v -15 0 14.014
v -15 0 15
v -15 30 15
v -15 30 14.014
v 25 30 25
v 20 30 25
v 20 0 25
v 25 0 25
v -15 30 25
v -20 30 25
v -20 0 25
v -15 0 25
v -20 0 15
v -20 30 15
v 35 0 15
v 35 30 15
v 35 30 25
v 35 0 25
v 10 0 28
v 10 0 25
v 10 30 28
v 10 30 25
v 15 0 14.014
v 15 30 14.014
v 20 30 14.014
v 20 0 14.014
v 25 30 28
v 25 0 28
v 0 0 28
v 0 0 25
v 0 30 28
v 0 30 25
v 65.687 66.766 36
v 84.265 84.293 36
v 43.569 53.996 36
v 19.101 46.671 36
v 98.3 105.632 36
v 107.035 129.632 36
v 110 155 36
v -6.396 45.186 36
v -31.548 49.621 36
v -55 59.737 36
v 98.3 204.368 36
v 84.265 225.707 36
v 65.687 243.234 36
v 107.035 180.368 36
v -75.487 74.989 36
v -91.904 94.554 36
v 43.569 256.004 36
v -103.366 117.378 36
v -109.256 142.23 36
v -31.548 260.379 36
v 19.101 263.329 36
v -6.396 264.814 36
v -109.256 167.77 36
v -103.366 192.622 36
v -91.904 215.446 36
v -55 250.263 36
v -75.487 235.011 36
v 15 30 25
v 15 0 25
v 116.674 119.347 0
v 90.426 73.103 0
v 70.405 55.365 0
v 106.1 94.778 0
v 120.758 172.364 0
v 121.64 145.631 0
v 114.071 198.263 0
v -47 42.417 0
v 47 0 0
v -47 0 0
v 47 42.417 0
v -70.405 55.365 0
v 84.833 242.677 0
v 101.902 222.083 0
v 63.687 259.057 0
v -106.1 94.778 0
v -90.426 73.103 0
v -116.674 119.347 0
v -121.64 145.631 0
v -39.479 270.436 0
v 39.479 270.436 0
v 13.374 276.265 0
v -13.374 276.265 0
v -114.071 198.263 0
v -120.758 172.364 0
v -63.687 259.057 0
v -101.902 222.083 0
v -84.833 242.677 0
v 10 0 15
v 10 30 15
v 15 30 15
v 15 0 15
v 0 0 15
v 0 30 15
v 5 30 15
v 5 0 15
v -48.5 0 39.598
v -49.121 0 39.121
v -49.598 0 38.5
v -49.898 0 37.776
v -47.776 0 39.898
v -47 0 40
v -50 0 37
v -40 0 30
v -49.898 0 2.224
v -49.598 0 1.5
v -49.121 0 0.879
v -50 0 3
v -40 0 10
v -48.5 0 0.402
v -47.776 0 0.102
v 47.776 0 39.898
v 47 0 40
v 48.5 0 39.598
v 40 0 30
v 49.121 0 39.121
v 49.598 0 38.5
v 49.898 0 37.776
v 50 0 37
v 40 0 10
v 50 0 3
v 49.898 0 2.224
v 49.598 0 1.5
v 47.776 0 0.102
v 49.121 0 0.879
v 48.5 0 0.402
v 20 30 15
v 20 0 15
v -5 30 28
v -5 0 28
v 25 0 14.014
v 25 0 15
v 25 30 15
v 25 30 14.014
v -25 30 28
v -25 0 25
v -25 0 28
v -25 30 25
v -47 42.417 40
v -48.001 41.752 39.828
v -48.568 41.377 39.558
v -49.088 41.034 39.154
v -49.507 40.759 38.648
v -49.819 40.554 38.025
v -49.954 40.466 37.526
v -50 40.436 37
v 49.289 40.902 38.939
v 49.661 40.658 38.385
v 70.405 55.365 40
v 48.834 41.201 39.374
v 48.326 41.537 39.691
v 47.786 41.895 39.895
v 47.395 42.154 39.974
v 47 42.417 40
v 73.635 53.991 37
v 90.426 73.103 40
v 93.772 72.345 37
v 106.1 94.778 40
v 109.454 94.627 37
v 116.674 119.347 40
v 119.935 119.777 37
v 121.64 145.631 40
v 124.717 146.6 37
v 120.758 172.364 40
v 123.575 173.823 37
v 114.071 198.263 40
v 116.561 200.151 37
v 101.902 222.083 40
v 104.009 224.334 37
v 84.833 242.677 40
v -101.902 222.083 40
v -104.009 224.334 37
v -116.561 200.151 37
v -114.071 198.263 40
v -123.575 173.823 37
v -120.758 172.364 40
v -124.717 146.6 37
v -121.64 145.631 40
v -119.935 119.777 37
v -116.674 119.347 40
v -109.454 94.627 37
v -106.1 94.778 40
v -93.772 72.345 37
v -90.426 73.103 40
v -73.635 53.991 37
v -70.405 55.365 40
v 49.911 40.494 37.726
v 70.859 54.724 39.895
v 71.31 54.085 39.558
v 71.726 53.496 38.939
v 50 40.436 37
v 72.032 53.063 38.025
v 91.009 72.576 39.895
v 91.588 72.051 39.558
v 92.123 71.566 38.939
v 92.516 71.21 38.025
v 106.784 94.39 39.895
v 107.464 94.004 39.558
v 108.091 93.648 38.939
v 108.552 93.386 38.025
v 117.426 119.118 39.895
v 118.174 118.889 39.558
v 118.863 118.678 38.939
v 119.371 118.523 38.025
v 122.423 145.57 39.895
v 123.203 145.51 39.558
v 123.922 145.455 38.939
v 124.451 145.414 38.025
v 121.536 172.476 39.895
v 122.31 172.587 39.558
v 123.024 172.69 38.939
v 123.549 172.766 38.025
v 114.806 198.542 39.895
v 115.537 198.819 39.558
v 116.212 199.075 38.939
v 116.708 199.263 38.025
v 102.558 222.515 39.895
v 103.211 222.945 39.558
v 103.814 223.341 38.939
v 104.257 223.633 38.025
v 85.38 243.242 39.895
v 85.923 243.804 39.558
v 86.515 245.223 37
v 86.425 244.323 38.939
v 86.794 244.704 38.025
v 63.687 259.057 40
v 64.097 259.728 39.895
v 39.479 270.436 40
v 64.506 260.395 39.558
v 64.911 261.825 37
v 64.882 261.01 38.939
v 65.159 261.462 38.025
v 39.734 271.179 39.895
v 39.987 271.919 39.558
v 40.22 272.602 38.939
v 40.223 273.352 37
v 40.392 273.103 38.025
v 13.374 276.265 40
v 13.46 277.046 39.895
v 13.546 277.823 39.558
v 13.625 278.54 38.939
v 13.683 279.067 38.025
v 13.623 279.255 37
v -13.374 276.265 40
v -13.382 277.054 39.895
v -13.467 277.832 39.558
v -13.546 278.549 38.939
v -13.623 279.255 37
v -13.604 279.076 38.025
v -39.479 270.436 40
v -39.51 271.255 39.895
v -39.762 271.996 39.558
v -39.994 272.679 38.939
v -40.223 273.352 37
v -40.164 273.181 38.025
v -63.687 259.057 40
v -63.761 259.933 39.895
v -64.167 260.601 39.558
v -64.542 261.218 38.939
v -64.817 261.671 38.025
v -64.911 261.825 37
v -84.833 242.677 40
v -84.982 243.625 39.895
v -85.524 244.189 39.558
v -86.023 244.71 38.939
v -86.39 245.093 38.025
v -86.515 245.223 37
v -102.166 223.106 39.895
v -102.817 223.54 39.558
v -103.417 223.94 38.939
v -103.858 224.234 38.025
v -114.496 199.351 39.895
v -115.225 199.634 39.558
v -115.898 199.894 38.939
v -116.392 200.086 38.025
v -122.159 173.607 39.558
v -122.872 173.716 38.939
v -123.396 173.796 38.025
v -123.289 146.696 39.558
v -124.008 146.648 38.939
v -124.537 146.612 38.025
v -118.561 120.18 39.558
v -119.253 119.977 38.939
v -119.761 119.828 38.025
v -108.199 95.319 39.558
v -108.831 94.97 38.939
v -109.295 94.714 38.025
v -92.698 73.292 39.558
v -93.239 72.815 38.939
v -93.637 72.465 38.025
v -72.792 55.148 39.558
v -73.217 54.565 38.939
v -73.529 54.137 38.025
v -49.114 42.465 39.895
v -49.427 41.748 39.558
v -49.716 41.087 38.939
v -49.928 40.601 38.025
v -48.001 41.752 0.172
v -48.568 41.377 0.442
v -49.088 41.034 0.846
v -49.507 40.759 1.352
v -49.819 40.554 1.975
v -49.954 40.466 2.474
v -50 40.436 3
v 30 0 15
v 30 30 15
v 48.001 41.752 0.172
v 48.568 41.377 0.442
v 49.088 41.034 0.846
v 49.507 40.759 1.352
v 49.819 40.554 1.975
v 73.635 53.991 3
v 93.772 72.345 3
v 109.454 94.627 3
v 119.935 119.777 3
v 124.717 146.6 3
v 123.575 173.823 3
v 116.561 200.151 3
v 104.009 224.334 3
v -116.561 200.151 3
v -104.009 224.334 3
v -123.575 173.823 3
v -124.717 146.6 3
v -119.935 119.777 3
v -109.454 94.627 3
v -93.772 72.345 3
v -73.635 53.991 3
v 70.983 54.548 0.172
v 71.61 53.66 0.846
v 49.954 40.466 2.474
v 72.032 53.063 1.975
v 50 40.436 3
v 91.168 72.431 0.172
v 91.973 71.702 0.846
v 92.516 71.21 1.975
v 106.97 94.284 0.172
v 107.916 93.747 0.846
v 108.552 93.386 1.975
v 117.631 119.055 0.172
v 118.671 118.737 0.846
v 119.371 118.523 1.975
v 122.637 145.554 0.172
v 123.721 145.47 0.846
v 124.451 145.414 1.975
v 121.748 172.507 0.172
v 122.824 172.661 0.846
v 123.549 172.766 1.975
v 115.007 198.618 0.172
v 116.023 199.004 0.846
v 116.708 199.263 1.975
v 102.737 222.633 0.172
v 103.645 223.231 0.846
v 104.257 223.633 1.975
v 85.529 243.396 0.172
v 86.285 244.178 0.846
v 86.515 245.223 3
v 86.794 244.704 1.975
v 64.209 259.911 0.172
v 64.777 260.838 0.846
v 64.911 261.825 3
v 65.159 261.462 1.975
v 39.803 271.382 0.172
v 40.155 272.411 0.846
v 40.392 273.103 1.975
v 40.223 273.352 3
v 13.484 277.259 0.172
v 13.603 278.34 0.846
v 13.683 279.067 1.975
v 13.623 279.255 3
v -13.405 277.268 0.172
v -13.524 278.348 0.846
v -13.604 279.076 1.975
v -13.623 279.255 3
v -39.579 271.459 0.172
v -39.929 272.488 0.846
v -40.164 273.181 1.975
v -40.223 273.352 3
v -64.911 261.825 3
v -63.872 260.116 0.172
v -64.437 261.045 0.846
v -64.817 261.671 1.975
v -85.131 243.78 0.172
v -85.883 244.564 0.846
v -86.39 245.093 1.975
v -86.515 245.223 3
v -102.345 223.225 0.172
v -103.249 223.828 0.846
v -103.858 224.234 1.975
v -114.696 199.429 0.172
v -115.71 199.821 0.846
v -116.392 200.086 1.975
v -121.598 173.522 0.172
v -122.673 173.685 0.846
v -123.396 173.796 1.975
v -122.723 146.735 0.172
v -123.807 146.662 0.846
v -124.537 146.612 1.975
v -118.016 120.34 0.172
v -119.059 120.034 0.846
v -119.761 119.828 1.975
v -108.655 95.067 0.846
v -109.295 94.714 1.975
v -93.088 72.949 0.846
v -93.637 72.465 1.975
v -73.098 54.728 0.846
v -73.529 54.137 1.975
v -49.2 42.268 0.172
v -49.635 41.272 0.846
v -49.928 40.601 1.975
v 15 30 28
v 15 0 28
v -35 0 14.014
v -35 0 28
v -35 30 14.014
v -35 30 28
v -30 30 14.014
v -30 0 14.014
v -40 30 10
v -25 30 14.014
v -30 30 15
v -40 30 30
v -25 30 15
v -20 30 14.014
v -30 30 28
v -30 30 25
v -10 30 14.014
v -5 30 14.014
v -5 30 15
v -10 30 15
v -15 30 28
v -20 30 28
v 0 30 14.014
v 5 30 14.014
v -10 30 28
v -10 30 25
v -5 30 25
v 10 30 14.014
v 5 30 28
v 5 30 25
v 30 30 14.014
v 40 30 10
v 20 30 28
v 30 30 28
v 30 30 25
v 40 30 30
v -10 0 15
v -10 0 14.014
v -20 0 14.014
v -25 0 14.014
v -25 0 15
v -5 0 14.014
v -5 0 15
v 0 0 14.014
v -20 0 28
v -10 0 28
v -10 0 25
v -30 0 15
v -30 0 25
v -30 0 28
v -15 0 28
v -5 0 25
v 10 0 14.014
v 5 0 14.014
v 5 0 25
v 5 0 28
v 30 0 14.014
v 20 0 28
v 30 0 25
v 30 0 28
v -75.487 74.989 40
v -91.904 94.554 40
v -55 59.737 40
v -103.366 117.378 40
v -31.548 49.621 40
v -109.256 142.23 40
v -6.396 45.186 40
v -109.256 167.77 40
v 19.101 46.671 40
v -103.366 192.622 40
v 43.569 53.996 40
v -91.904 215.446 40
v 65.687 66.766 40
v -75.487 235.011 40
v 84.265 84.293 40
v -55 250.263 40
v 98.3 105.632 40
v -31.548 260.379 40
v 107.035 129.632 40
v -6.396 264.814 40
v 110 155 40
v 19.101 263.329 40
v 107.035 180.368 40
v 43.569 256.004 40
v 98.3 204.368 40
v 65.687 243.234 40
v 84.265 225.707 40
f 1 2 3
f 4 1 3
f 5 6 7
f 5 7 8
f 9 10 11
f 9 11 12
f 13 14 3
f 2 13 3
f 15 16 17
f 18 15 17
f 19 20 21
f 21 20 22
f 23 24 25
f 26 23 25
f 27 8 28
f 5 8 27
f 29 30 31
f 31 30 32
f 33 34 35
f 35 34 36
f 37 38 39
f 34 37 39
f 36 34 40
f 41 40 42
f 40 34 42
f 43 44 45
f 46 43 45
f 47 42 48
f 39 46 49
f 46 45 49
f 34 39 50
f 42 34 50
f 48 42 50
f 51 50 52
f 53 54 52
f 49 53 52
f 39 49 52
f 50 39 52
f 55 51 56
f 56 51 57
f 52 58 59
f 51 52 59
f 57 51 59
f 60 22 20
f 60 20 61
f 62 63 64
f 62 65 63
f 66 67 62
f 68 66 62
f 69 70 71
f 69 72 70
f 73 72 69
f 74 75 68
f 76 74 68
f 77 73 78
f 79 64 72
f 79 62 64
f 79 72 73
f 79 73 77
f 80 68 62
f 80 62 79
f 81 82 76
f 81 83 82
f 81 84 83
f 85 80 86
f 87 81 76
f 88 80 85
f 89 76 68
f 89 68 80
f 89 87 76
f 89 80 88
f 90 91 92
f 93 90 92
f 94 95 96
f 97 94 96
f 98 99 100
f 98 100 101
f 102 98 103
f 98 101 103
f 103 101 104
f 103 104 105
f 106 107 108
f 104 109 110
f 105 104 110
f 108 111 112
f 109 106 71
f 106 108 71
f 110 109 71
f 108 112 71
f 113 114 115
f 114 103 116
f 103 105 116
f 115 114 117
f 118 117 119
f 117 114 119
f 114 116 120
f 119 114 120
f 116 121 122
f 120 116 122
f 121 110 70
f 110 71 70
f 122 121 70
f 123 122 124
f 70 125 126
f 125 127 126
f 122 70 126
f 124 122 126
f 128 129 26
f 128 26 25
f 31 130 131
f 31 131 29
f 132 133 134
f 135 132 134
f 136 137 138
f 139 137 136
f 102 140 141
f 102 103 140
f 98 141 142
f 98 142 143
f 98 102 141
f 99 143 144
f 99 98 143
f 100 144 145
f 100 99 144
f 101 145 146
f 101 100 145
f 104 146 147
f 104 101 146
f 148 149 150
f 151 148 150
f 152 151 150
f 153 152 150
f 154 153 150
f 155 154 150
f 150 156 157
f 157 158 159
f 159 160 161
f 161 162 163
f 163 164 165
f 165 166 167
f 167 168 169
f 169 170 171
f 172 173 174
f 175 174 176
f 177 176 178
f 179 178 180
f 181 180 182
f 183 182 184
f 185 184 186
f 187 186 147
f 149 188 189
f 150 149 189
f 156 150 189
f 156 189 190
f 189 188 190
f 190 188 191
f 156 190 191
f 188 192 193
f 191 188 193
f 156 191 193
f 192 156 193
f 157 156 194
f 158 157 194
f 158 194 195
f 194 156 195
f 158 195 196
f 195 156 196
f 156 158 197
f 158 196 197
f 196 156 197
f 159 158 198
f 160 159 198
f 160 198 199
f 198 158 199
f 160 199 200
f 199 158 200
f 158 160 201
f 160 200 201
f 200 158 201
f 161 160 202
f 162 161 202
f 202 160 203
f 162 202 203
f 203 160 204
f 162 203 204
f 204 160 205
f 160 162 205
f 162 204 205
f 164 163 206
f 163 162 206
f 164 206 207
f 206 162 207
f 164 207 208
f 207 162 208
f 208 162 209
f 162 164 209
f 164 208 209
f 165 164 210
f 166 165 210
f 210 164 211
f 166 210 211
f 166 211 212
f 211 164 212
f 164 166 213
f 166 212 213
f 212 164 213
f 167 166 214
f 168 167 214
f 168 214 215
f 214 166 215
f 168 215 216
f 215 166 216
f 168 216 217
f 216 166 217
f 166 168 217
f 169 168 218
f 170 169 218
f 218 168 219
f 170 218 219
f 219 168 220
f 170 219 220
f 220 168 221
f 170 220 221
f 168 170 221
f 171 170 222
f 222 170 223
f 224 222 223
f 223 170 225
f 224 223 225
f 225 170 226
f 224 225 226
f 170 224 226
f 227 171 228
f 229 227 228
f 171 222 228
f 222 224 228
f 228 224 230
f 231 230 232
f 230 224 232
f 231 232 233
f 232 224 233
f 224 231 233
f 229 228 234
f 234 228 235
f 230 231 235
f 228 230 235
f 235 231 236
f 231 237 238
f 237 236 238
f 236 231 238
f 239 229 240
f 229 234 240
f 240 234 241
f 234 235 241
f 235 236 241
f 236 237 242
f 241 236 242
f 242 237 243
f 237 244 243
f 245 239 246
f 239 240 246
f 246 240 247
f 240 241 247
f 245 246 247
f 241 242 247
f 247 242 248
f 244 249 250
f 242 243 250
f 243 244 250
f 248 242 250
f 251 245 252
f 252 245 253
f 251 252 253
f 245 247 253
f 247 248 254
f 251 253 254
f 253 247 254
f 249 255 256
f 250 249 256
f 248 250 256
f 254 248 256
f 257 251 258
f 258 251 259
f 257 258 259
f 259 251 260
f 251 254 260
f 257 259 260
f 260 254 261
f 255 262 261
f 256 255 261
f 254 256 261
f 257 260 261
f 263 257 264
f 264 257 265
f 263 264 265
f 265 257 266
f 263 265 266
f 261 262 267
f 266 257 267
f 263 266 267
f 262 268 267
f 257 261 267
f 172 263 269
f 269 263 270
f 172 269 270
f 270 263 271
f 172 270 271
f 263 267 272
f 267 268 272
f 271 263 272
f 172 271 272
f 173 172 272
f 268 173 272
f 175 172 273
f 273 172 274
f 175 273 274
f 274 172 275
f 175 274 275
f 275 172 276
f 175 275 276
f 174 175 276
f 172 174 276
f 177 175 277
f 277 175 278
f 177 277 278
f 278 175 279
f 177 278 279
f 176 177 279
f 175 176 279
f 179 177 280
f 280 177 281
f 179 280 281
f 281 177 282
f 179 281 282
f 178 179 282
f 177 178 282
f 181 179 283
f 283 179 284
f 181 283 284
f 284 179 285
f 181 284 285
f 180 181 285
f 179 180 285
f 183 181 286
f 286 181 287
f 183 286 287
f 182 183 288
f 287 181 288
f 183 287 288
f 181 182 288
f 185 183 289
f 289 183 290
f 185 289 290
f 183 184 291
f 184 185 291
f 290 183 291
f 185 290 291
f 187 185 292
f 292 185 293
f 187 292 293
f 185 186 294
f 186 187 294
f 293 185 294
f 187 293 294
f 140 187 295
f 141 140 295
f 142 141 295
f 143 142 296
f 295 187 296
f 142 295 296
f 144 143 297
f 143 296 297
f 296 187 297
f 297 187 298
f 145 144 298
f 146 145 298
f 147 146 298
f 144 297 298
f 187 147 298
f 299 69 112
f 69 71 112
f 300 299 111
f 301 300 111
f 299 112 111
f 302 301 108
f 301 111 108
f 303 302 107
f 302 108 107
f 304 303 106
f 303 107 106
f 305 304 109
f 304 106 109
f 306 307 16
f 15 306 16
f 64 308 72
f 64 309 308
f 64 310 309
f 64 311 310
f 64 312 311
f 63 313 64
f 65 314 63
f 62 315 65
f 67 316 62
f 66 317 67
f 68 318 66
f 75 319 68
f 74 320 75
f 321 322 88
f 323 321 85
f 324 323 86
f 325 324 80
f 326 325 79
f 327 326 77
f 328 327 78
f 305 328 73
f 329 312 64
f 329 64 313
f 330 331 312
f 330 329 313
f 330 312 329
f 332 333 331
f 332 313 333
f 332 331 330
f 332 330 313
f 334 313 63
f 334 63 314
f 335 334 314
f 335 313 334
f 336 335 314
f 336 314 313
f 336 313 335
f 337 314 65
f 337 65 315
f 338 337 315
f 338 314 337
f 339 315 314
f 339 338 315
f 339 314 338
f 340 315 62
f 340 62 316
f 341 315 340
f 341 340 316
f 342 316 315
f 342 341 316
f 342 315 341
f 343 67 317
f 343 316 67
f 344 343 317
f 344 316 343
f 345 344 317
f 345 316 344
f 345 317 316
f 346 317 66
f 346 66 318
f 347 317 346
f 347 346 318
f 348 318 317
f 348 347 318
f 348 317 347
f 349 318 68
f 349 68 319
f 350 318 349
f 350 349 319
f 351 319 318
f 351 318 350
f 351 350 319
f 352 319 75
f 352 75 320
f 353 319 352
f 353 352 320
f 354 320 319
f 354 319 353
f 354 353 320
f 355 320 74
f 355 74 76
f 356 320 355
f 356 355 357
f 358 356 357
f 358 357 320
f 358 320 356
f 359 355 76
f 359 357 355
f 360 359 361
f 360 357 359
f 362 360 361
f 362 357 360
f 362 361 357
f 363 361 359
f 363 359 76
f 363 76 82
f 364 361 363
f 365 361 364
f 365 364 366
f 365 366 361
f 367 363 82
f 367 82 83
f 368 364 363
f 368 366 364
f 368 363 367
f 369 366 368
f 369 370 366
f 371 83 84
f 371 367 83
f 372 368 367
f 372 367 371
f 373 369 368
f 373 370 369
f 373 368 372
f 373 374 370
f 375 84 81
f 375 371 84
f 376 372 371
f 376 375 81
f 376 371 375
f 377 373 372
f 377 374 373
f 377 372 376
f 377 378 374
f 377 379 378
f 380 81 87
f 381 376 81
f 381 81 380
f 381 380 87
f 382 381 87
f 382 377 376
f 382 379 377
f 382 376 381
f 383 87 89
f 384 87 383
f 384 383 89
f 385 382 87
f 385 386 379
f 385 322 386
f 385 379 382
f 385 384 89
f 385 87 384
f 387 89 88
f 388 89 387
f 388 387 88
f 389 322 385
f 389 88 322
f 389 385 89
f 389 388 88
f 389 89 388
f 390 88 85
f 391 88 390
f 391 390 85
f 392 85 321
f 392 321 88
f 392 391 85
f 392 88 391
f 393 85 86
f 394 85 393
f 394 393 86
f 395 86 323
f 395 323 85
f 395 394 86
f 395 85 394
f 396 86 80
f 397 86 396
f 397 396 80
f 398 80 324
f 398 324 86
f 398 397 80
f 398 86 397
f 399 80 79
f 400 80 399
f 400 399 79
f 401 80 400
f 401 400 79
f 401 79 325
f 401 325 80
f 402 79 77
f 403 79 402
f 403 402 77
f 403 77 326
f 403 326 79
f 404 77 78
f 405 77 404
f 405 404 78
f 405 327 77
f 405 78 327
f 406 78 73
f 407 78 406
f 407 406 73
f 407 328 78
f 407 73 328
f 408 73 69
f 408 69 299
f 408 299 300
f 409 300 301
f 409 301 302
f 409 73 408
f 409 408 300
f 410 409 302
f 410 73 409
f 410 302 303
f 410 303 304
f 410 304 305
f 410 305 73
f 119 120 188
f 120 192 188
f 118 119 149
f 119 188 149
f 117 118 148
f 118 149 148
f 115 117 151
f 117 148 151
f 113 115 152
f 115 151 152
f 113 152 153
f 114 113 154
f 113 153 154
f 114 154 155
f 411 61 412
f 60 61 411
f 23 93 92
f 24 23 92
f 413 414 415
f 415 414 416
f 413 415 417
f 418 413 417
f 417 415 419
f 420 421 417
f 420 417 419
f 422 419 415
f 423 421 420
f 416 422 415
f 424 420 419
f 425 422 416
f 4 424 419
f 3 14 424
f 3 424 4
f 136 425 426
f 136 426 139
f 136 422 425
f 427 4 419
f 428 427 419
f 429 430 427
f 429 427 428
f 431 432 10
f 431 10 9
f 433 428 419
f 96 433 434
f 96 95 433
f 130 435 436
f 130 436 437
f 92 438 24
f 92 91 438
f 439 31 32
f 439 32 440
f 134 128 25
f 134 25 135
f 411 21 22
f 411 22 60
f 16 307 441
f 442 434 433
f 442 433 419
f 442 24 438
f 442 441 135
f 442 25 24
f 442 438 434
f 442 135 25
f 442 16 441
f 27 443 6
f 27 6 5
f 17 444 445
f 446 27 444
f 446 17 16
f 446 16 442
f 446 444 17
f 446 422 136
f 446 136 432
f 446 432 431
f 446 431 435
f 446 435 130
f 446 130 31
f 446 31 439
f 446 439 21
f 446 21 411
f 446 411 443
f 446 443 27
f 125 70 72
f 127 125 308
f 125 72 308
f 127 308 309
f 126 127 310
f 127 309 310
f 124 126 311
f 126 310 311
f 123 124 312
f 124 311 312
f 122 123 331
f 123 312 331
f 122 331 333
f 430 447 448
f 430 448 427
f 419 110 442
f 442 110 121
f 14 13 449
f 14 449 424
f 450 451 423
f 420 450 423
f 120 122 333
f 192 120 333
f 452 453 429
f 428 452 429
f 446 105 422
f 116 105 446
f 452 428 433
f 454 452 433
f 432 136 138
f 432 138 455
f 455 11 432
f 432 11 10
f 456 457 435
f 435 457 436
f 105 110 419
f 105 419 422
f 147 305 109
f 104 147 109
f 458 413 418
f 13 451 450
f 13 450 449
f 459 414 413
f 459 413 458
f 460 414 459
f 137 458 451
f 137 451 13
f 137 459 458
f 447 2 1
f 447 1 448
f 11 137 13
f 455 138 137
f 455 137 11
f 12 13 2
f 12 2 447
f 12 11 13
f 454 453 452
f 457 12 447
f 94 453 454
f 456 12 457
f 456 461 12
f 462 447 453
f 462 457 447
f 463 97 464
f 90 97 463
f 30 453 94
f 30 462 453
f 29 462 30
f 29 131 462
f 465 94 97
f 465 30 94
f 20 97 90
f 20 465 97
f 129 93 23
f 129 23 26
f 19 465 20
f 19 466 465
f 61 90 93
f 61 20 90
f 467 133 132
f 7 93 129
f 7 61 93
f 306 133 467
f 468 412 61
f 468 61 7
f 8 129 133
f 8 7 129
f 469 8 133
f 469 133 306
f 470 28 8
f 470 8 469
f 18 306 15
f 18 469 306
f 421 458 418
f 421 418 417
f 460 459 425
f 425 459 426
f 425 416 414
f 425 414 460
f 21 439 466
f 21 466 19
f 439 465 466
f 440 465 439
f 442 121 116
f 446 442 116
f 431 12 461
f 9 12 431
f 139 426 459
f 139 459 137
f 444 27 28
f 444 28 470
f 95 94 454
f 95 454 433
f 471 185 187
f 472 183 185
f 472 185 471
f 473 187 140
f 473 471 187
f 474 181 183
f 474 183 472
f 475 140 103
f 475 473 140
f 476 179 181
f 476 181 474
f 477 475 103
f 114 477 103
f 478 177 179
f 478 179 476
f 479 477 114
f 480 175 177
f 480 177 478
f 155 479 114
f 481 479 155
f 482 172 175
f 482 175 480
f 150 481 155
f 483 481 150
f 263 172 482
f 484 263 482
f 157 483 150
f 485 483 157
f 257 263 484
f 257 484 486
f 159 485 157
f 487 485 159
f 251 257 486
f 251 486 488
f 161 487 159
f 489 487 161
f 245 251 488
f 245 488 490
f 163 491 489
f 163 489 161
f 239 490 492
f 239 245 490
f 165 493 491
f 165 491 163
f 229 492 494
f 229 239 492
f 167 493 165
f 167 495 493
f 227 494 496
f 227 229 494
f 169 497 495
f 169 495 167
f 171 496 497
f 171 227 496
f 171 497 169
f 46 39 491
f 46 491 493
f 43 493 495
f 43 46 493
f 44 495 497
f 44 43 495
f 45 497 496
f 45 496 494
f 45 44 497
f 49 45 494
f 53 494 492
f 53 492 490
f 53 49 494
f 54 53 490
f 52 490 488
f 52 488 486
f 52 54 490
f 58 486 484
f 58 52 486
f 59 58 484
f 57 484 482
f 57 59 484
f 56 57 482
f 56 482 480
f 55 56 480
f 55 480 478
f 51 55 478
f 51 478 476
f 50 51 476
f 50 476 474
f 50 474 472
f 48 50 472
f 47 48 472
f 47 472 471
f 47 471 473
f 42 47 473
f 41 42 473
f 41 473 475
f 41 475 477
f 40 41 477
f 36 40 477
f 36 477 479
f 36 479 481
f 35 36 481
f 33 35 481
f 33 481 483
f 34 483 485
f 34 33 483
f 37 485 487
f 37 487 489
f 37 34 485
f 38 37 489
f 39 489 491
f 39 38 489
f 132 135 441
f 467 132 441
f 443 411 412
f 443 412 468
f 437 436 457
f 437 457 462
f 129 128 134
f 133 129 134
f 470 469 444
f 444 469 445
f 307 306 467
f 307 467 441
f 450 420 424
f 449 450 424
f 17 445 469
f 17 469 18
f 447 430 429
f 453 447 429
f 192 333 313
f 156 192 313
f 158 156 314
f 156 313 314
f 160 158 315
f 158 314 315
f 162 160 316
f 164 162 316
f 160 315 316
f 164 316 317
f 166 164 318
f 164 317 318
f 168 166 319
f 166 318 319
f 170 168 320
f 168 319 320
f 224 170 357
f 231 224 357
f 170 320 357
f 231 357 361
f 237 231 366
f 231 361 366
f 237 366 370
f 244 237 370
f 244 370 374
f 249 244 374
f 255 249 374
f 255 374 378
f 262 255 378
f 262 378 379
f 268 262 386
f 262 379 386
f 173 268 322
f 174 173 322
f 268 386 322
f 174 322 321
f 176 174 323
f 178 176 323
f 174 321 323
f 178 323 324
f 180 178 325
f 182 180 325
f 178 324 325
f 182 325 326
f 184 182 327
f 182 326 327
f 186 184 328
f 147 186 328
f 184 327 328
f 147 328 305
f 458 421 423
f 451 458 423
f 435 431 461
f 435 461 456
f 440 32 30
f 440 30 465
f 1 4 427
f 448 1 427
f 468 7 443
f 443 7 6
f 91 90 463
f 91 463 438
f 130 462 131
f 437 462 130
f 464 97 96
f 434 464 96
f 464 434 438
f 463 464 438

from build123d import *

# Parameters (mm, degrees)
SKETCH2_R           = 110
BOSS_EXTRUDE1_DEPTH = 40
SKETCH5_R           = 110
BOSS_EXTRUDE2_DEPTH = 36
FILLET1_R           = 3
SKETCH6_W           = 80
SKETCH6_H           = 20
CUT_EXTRUDE2_DEPTH  = 30
SKETCH7_W           = 70
SKETCH7_H           = 10
BOSS_EXTRUDE3_DEPTH = 30
SKETCH8_W           = 5
SKETCH8_H           = 30
BOSS_EXTRUDE4_DEPTH = 3


with BuildPart() as part:
    # Sketch2 → Boss-Extrude1 (new body)
    with BuildSketch(Plane.XY):
        with BuildLine():
            Line((-50, 0), (50, 0))
            Line((50, 0), (50, 40.435607626))
            ThreePointArc((50, 40.435607626), (0, 280), (-50, 40.435607626))
            Line((-50, 40.435607626), (-50, 0))
        make_face()
        with Locations((0, 155)):
            Circle(SKETCH2_R, mode=Mode.SUBTRACT)
    extrude(amount=BOSS_EXTRUDE1_DEPTH)

    # Sketch5 → Boss-Extrude2 (add)
    with BuildSketch(Plane(origin=(0, 0, 0), x_dir=(-1, 0, 0), z_dir=(0, 0, -1))):
        with Locations((0, 155)):
            Circle(SKETCH5_R)
    extrude(amount=-BOSS_EXTRUDE2_DEPTH)

    # Fillet1
    fillet1_edges = [part.edges().sort_by_distance(p)[0] for p in [
        (-50, 20.217803813, 40),
        (50, 20.217803813, 40),
        (-50, 20.217803813, 0),
        (0, 280, 0),
        (50, 20.217803813, 0),
        (0, 280, 40),
    ]]
    fillet(fillet1_edges, radius=FILLET1_R)

    # Sketch6 → Cut-Extrude2 (cut)
    with BuildSketch(Plane.XZ):
        with Locations((0, 20)):
            Rectangle(SKETCH6_W, SKETCH6_H)
    extrude(amount=-CUT_EXTRUDE2_DEPTH, mode=Mode.SUBTRACT)

    # Sketch7 → Boss-Extrude3 (add)
    with BuildSketch(Plane.XZ.offset(-30)):
        with Locations((0, 20)):
            Rectangle(SKETCH7_W, SKETCH7_H)
    extrude(amount=BOSS_EXTRUDE3_DEPTH)

    # Sketch8 → Boss-Extrude4 (add)
    with BuildSketch(Plane.XY.offset(25)):
        with Locations((-32.5, 15)):
            Rectangle(SKETCH8_W, SKETCH8_H)
        with Locations((-22.5, 15)):
            Rectangle(SKETCH8_W, SKETCH8_H)
        with Locations((-12.5, 15)):
            Rectangle(SKETCH8_W, SKETCH8_H)
        with Locations((-2.5, 15)):
            Rectangle(SKETCH8_W, SKETCH8_H)
        with Locations((7.5, 15)):
            Rectangle(SKETCH8_W, SKETCH8_H)
        with Locations((17.5, 15)):
            Rectangle(SKETCH8_W, SKETCH8_H)
        with Locations((27.5, 15)):
            Rectangle(SKETCH8_W, SKETCH8_H)
    boss_extrude4 = extrude(amount=BOSS_EXTRUDE4_DEPTH)

    # Mirror2: Boss-Extrude4 across plane
    add(boss_extrude4.mirror(Plane.XY.offset(21.007174775)))


solid = part.part
